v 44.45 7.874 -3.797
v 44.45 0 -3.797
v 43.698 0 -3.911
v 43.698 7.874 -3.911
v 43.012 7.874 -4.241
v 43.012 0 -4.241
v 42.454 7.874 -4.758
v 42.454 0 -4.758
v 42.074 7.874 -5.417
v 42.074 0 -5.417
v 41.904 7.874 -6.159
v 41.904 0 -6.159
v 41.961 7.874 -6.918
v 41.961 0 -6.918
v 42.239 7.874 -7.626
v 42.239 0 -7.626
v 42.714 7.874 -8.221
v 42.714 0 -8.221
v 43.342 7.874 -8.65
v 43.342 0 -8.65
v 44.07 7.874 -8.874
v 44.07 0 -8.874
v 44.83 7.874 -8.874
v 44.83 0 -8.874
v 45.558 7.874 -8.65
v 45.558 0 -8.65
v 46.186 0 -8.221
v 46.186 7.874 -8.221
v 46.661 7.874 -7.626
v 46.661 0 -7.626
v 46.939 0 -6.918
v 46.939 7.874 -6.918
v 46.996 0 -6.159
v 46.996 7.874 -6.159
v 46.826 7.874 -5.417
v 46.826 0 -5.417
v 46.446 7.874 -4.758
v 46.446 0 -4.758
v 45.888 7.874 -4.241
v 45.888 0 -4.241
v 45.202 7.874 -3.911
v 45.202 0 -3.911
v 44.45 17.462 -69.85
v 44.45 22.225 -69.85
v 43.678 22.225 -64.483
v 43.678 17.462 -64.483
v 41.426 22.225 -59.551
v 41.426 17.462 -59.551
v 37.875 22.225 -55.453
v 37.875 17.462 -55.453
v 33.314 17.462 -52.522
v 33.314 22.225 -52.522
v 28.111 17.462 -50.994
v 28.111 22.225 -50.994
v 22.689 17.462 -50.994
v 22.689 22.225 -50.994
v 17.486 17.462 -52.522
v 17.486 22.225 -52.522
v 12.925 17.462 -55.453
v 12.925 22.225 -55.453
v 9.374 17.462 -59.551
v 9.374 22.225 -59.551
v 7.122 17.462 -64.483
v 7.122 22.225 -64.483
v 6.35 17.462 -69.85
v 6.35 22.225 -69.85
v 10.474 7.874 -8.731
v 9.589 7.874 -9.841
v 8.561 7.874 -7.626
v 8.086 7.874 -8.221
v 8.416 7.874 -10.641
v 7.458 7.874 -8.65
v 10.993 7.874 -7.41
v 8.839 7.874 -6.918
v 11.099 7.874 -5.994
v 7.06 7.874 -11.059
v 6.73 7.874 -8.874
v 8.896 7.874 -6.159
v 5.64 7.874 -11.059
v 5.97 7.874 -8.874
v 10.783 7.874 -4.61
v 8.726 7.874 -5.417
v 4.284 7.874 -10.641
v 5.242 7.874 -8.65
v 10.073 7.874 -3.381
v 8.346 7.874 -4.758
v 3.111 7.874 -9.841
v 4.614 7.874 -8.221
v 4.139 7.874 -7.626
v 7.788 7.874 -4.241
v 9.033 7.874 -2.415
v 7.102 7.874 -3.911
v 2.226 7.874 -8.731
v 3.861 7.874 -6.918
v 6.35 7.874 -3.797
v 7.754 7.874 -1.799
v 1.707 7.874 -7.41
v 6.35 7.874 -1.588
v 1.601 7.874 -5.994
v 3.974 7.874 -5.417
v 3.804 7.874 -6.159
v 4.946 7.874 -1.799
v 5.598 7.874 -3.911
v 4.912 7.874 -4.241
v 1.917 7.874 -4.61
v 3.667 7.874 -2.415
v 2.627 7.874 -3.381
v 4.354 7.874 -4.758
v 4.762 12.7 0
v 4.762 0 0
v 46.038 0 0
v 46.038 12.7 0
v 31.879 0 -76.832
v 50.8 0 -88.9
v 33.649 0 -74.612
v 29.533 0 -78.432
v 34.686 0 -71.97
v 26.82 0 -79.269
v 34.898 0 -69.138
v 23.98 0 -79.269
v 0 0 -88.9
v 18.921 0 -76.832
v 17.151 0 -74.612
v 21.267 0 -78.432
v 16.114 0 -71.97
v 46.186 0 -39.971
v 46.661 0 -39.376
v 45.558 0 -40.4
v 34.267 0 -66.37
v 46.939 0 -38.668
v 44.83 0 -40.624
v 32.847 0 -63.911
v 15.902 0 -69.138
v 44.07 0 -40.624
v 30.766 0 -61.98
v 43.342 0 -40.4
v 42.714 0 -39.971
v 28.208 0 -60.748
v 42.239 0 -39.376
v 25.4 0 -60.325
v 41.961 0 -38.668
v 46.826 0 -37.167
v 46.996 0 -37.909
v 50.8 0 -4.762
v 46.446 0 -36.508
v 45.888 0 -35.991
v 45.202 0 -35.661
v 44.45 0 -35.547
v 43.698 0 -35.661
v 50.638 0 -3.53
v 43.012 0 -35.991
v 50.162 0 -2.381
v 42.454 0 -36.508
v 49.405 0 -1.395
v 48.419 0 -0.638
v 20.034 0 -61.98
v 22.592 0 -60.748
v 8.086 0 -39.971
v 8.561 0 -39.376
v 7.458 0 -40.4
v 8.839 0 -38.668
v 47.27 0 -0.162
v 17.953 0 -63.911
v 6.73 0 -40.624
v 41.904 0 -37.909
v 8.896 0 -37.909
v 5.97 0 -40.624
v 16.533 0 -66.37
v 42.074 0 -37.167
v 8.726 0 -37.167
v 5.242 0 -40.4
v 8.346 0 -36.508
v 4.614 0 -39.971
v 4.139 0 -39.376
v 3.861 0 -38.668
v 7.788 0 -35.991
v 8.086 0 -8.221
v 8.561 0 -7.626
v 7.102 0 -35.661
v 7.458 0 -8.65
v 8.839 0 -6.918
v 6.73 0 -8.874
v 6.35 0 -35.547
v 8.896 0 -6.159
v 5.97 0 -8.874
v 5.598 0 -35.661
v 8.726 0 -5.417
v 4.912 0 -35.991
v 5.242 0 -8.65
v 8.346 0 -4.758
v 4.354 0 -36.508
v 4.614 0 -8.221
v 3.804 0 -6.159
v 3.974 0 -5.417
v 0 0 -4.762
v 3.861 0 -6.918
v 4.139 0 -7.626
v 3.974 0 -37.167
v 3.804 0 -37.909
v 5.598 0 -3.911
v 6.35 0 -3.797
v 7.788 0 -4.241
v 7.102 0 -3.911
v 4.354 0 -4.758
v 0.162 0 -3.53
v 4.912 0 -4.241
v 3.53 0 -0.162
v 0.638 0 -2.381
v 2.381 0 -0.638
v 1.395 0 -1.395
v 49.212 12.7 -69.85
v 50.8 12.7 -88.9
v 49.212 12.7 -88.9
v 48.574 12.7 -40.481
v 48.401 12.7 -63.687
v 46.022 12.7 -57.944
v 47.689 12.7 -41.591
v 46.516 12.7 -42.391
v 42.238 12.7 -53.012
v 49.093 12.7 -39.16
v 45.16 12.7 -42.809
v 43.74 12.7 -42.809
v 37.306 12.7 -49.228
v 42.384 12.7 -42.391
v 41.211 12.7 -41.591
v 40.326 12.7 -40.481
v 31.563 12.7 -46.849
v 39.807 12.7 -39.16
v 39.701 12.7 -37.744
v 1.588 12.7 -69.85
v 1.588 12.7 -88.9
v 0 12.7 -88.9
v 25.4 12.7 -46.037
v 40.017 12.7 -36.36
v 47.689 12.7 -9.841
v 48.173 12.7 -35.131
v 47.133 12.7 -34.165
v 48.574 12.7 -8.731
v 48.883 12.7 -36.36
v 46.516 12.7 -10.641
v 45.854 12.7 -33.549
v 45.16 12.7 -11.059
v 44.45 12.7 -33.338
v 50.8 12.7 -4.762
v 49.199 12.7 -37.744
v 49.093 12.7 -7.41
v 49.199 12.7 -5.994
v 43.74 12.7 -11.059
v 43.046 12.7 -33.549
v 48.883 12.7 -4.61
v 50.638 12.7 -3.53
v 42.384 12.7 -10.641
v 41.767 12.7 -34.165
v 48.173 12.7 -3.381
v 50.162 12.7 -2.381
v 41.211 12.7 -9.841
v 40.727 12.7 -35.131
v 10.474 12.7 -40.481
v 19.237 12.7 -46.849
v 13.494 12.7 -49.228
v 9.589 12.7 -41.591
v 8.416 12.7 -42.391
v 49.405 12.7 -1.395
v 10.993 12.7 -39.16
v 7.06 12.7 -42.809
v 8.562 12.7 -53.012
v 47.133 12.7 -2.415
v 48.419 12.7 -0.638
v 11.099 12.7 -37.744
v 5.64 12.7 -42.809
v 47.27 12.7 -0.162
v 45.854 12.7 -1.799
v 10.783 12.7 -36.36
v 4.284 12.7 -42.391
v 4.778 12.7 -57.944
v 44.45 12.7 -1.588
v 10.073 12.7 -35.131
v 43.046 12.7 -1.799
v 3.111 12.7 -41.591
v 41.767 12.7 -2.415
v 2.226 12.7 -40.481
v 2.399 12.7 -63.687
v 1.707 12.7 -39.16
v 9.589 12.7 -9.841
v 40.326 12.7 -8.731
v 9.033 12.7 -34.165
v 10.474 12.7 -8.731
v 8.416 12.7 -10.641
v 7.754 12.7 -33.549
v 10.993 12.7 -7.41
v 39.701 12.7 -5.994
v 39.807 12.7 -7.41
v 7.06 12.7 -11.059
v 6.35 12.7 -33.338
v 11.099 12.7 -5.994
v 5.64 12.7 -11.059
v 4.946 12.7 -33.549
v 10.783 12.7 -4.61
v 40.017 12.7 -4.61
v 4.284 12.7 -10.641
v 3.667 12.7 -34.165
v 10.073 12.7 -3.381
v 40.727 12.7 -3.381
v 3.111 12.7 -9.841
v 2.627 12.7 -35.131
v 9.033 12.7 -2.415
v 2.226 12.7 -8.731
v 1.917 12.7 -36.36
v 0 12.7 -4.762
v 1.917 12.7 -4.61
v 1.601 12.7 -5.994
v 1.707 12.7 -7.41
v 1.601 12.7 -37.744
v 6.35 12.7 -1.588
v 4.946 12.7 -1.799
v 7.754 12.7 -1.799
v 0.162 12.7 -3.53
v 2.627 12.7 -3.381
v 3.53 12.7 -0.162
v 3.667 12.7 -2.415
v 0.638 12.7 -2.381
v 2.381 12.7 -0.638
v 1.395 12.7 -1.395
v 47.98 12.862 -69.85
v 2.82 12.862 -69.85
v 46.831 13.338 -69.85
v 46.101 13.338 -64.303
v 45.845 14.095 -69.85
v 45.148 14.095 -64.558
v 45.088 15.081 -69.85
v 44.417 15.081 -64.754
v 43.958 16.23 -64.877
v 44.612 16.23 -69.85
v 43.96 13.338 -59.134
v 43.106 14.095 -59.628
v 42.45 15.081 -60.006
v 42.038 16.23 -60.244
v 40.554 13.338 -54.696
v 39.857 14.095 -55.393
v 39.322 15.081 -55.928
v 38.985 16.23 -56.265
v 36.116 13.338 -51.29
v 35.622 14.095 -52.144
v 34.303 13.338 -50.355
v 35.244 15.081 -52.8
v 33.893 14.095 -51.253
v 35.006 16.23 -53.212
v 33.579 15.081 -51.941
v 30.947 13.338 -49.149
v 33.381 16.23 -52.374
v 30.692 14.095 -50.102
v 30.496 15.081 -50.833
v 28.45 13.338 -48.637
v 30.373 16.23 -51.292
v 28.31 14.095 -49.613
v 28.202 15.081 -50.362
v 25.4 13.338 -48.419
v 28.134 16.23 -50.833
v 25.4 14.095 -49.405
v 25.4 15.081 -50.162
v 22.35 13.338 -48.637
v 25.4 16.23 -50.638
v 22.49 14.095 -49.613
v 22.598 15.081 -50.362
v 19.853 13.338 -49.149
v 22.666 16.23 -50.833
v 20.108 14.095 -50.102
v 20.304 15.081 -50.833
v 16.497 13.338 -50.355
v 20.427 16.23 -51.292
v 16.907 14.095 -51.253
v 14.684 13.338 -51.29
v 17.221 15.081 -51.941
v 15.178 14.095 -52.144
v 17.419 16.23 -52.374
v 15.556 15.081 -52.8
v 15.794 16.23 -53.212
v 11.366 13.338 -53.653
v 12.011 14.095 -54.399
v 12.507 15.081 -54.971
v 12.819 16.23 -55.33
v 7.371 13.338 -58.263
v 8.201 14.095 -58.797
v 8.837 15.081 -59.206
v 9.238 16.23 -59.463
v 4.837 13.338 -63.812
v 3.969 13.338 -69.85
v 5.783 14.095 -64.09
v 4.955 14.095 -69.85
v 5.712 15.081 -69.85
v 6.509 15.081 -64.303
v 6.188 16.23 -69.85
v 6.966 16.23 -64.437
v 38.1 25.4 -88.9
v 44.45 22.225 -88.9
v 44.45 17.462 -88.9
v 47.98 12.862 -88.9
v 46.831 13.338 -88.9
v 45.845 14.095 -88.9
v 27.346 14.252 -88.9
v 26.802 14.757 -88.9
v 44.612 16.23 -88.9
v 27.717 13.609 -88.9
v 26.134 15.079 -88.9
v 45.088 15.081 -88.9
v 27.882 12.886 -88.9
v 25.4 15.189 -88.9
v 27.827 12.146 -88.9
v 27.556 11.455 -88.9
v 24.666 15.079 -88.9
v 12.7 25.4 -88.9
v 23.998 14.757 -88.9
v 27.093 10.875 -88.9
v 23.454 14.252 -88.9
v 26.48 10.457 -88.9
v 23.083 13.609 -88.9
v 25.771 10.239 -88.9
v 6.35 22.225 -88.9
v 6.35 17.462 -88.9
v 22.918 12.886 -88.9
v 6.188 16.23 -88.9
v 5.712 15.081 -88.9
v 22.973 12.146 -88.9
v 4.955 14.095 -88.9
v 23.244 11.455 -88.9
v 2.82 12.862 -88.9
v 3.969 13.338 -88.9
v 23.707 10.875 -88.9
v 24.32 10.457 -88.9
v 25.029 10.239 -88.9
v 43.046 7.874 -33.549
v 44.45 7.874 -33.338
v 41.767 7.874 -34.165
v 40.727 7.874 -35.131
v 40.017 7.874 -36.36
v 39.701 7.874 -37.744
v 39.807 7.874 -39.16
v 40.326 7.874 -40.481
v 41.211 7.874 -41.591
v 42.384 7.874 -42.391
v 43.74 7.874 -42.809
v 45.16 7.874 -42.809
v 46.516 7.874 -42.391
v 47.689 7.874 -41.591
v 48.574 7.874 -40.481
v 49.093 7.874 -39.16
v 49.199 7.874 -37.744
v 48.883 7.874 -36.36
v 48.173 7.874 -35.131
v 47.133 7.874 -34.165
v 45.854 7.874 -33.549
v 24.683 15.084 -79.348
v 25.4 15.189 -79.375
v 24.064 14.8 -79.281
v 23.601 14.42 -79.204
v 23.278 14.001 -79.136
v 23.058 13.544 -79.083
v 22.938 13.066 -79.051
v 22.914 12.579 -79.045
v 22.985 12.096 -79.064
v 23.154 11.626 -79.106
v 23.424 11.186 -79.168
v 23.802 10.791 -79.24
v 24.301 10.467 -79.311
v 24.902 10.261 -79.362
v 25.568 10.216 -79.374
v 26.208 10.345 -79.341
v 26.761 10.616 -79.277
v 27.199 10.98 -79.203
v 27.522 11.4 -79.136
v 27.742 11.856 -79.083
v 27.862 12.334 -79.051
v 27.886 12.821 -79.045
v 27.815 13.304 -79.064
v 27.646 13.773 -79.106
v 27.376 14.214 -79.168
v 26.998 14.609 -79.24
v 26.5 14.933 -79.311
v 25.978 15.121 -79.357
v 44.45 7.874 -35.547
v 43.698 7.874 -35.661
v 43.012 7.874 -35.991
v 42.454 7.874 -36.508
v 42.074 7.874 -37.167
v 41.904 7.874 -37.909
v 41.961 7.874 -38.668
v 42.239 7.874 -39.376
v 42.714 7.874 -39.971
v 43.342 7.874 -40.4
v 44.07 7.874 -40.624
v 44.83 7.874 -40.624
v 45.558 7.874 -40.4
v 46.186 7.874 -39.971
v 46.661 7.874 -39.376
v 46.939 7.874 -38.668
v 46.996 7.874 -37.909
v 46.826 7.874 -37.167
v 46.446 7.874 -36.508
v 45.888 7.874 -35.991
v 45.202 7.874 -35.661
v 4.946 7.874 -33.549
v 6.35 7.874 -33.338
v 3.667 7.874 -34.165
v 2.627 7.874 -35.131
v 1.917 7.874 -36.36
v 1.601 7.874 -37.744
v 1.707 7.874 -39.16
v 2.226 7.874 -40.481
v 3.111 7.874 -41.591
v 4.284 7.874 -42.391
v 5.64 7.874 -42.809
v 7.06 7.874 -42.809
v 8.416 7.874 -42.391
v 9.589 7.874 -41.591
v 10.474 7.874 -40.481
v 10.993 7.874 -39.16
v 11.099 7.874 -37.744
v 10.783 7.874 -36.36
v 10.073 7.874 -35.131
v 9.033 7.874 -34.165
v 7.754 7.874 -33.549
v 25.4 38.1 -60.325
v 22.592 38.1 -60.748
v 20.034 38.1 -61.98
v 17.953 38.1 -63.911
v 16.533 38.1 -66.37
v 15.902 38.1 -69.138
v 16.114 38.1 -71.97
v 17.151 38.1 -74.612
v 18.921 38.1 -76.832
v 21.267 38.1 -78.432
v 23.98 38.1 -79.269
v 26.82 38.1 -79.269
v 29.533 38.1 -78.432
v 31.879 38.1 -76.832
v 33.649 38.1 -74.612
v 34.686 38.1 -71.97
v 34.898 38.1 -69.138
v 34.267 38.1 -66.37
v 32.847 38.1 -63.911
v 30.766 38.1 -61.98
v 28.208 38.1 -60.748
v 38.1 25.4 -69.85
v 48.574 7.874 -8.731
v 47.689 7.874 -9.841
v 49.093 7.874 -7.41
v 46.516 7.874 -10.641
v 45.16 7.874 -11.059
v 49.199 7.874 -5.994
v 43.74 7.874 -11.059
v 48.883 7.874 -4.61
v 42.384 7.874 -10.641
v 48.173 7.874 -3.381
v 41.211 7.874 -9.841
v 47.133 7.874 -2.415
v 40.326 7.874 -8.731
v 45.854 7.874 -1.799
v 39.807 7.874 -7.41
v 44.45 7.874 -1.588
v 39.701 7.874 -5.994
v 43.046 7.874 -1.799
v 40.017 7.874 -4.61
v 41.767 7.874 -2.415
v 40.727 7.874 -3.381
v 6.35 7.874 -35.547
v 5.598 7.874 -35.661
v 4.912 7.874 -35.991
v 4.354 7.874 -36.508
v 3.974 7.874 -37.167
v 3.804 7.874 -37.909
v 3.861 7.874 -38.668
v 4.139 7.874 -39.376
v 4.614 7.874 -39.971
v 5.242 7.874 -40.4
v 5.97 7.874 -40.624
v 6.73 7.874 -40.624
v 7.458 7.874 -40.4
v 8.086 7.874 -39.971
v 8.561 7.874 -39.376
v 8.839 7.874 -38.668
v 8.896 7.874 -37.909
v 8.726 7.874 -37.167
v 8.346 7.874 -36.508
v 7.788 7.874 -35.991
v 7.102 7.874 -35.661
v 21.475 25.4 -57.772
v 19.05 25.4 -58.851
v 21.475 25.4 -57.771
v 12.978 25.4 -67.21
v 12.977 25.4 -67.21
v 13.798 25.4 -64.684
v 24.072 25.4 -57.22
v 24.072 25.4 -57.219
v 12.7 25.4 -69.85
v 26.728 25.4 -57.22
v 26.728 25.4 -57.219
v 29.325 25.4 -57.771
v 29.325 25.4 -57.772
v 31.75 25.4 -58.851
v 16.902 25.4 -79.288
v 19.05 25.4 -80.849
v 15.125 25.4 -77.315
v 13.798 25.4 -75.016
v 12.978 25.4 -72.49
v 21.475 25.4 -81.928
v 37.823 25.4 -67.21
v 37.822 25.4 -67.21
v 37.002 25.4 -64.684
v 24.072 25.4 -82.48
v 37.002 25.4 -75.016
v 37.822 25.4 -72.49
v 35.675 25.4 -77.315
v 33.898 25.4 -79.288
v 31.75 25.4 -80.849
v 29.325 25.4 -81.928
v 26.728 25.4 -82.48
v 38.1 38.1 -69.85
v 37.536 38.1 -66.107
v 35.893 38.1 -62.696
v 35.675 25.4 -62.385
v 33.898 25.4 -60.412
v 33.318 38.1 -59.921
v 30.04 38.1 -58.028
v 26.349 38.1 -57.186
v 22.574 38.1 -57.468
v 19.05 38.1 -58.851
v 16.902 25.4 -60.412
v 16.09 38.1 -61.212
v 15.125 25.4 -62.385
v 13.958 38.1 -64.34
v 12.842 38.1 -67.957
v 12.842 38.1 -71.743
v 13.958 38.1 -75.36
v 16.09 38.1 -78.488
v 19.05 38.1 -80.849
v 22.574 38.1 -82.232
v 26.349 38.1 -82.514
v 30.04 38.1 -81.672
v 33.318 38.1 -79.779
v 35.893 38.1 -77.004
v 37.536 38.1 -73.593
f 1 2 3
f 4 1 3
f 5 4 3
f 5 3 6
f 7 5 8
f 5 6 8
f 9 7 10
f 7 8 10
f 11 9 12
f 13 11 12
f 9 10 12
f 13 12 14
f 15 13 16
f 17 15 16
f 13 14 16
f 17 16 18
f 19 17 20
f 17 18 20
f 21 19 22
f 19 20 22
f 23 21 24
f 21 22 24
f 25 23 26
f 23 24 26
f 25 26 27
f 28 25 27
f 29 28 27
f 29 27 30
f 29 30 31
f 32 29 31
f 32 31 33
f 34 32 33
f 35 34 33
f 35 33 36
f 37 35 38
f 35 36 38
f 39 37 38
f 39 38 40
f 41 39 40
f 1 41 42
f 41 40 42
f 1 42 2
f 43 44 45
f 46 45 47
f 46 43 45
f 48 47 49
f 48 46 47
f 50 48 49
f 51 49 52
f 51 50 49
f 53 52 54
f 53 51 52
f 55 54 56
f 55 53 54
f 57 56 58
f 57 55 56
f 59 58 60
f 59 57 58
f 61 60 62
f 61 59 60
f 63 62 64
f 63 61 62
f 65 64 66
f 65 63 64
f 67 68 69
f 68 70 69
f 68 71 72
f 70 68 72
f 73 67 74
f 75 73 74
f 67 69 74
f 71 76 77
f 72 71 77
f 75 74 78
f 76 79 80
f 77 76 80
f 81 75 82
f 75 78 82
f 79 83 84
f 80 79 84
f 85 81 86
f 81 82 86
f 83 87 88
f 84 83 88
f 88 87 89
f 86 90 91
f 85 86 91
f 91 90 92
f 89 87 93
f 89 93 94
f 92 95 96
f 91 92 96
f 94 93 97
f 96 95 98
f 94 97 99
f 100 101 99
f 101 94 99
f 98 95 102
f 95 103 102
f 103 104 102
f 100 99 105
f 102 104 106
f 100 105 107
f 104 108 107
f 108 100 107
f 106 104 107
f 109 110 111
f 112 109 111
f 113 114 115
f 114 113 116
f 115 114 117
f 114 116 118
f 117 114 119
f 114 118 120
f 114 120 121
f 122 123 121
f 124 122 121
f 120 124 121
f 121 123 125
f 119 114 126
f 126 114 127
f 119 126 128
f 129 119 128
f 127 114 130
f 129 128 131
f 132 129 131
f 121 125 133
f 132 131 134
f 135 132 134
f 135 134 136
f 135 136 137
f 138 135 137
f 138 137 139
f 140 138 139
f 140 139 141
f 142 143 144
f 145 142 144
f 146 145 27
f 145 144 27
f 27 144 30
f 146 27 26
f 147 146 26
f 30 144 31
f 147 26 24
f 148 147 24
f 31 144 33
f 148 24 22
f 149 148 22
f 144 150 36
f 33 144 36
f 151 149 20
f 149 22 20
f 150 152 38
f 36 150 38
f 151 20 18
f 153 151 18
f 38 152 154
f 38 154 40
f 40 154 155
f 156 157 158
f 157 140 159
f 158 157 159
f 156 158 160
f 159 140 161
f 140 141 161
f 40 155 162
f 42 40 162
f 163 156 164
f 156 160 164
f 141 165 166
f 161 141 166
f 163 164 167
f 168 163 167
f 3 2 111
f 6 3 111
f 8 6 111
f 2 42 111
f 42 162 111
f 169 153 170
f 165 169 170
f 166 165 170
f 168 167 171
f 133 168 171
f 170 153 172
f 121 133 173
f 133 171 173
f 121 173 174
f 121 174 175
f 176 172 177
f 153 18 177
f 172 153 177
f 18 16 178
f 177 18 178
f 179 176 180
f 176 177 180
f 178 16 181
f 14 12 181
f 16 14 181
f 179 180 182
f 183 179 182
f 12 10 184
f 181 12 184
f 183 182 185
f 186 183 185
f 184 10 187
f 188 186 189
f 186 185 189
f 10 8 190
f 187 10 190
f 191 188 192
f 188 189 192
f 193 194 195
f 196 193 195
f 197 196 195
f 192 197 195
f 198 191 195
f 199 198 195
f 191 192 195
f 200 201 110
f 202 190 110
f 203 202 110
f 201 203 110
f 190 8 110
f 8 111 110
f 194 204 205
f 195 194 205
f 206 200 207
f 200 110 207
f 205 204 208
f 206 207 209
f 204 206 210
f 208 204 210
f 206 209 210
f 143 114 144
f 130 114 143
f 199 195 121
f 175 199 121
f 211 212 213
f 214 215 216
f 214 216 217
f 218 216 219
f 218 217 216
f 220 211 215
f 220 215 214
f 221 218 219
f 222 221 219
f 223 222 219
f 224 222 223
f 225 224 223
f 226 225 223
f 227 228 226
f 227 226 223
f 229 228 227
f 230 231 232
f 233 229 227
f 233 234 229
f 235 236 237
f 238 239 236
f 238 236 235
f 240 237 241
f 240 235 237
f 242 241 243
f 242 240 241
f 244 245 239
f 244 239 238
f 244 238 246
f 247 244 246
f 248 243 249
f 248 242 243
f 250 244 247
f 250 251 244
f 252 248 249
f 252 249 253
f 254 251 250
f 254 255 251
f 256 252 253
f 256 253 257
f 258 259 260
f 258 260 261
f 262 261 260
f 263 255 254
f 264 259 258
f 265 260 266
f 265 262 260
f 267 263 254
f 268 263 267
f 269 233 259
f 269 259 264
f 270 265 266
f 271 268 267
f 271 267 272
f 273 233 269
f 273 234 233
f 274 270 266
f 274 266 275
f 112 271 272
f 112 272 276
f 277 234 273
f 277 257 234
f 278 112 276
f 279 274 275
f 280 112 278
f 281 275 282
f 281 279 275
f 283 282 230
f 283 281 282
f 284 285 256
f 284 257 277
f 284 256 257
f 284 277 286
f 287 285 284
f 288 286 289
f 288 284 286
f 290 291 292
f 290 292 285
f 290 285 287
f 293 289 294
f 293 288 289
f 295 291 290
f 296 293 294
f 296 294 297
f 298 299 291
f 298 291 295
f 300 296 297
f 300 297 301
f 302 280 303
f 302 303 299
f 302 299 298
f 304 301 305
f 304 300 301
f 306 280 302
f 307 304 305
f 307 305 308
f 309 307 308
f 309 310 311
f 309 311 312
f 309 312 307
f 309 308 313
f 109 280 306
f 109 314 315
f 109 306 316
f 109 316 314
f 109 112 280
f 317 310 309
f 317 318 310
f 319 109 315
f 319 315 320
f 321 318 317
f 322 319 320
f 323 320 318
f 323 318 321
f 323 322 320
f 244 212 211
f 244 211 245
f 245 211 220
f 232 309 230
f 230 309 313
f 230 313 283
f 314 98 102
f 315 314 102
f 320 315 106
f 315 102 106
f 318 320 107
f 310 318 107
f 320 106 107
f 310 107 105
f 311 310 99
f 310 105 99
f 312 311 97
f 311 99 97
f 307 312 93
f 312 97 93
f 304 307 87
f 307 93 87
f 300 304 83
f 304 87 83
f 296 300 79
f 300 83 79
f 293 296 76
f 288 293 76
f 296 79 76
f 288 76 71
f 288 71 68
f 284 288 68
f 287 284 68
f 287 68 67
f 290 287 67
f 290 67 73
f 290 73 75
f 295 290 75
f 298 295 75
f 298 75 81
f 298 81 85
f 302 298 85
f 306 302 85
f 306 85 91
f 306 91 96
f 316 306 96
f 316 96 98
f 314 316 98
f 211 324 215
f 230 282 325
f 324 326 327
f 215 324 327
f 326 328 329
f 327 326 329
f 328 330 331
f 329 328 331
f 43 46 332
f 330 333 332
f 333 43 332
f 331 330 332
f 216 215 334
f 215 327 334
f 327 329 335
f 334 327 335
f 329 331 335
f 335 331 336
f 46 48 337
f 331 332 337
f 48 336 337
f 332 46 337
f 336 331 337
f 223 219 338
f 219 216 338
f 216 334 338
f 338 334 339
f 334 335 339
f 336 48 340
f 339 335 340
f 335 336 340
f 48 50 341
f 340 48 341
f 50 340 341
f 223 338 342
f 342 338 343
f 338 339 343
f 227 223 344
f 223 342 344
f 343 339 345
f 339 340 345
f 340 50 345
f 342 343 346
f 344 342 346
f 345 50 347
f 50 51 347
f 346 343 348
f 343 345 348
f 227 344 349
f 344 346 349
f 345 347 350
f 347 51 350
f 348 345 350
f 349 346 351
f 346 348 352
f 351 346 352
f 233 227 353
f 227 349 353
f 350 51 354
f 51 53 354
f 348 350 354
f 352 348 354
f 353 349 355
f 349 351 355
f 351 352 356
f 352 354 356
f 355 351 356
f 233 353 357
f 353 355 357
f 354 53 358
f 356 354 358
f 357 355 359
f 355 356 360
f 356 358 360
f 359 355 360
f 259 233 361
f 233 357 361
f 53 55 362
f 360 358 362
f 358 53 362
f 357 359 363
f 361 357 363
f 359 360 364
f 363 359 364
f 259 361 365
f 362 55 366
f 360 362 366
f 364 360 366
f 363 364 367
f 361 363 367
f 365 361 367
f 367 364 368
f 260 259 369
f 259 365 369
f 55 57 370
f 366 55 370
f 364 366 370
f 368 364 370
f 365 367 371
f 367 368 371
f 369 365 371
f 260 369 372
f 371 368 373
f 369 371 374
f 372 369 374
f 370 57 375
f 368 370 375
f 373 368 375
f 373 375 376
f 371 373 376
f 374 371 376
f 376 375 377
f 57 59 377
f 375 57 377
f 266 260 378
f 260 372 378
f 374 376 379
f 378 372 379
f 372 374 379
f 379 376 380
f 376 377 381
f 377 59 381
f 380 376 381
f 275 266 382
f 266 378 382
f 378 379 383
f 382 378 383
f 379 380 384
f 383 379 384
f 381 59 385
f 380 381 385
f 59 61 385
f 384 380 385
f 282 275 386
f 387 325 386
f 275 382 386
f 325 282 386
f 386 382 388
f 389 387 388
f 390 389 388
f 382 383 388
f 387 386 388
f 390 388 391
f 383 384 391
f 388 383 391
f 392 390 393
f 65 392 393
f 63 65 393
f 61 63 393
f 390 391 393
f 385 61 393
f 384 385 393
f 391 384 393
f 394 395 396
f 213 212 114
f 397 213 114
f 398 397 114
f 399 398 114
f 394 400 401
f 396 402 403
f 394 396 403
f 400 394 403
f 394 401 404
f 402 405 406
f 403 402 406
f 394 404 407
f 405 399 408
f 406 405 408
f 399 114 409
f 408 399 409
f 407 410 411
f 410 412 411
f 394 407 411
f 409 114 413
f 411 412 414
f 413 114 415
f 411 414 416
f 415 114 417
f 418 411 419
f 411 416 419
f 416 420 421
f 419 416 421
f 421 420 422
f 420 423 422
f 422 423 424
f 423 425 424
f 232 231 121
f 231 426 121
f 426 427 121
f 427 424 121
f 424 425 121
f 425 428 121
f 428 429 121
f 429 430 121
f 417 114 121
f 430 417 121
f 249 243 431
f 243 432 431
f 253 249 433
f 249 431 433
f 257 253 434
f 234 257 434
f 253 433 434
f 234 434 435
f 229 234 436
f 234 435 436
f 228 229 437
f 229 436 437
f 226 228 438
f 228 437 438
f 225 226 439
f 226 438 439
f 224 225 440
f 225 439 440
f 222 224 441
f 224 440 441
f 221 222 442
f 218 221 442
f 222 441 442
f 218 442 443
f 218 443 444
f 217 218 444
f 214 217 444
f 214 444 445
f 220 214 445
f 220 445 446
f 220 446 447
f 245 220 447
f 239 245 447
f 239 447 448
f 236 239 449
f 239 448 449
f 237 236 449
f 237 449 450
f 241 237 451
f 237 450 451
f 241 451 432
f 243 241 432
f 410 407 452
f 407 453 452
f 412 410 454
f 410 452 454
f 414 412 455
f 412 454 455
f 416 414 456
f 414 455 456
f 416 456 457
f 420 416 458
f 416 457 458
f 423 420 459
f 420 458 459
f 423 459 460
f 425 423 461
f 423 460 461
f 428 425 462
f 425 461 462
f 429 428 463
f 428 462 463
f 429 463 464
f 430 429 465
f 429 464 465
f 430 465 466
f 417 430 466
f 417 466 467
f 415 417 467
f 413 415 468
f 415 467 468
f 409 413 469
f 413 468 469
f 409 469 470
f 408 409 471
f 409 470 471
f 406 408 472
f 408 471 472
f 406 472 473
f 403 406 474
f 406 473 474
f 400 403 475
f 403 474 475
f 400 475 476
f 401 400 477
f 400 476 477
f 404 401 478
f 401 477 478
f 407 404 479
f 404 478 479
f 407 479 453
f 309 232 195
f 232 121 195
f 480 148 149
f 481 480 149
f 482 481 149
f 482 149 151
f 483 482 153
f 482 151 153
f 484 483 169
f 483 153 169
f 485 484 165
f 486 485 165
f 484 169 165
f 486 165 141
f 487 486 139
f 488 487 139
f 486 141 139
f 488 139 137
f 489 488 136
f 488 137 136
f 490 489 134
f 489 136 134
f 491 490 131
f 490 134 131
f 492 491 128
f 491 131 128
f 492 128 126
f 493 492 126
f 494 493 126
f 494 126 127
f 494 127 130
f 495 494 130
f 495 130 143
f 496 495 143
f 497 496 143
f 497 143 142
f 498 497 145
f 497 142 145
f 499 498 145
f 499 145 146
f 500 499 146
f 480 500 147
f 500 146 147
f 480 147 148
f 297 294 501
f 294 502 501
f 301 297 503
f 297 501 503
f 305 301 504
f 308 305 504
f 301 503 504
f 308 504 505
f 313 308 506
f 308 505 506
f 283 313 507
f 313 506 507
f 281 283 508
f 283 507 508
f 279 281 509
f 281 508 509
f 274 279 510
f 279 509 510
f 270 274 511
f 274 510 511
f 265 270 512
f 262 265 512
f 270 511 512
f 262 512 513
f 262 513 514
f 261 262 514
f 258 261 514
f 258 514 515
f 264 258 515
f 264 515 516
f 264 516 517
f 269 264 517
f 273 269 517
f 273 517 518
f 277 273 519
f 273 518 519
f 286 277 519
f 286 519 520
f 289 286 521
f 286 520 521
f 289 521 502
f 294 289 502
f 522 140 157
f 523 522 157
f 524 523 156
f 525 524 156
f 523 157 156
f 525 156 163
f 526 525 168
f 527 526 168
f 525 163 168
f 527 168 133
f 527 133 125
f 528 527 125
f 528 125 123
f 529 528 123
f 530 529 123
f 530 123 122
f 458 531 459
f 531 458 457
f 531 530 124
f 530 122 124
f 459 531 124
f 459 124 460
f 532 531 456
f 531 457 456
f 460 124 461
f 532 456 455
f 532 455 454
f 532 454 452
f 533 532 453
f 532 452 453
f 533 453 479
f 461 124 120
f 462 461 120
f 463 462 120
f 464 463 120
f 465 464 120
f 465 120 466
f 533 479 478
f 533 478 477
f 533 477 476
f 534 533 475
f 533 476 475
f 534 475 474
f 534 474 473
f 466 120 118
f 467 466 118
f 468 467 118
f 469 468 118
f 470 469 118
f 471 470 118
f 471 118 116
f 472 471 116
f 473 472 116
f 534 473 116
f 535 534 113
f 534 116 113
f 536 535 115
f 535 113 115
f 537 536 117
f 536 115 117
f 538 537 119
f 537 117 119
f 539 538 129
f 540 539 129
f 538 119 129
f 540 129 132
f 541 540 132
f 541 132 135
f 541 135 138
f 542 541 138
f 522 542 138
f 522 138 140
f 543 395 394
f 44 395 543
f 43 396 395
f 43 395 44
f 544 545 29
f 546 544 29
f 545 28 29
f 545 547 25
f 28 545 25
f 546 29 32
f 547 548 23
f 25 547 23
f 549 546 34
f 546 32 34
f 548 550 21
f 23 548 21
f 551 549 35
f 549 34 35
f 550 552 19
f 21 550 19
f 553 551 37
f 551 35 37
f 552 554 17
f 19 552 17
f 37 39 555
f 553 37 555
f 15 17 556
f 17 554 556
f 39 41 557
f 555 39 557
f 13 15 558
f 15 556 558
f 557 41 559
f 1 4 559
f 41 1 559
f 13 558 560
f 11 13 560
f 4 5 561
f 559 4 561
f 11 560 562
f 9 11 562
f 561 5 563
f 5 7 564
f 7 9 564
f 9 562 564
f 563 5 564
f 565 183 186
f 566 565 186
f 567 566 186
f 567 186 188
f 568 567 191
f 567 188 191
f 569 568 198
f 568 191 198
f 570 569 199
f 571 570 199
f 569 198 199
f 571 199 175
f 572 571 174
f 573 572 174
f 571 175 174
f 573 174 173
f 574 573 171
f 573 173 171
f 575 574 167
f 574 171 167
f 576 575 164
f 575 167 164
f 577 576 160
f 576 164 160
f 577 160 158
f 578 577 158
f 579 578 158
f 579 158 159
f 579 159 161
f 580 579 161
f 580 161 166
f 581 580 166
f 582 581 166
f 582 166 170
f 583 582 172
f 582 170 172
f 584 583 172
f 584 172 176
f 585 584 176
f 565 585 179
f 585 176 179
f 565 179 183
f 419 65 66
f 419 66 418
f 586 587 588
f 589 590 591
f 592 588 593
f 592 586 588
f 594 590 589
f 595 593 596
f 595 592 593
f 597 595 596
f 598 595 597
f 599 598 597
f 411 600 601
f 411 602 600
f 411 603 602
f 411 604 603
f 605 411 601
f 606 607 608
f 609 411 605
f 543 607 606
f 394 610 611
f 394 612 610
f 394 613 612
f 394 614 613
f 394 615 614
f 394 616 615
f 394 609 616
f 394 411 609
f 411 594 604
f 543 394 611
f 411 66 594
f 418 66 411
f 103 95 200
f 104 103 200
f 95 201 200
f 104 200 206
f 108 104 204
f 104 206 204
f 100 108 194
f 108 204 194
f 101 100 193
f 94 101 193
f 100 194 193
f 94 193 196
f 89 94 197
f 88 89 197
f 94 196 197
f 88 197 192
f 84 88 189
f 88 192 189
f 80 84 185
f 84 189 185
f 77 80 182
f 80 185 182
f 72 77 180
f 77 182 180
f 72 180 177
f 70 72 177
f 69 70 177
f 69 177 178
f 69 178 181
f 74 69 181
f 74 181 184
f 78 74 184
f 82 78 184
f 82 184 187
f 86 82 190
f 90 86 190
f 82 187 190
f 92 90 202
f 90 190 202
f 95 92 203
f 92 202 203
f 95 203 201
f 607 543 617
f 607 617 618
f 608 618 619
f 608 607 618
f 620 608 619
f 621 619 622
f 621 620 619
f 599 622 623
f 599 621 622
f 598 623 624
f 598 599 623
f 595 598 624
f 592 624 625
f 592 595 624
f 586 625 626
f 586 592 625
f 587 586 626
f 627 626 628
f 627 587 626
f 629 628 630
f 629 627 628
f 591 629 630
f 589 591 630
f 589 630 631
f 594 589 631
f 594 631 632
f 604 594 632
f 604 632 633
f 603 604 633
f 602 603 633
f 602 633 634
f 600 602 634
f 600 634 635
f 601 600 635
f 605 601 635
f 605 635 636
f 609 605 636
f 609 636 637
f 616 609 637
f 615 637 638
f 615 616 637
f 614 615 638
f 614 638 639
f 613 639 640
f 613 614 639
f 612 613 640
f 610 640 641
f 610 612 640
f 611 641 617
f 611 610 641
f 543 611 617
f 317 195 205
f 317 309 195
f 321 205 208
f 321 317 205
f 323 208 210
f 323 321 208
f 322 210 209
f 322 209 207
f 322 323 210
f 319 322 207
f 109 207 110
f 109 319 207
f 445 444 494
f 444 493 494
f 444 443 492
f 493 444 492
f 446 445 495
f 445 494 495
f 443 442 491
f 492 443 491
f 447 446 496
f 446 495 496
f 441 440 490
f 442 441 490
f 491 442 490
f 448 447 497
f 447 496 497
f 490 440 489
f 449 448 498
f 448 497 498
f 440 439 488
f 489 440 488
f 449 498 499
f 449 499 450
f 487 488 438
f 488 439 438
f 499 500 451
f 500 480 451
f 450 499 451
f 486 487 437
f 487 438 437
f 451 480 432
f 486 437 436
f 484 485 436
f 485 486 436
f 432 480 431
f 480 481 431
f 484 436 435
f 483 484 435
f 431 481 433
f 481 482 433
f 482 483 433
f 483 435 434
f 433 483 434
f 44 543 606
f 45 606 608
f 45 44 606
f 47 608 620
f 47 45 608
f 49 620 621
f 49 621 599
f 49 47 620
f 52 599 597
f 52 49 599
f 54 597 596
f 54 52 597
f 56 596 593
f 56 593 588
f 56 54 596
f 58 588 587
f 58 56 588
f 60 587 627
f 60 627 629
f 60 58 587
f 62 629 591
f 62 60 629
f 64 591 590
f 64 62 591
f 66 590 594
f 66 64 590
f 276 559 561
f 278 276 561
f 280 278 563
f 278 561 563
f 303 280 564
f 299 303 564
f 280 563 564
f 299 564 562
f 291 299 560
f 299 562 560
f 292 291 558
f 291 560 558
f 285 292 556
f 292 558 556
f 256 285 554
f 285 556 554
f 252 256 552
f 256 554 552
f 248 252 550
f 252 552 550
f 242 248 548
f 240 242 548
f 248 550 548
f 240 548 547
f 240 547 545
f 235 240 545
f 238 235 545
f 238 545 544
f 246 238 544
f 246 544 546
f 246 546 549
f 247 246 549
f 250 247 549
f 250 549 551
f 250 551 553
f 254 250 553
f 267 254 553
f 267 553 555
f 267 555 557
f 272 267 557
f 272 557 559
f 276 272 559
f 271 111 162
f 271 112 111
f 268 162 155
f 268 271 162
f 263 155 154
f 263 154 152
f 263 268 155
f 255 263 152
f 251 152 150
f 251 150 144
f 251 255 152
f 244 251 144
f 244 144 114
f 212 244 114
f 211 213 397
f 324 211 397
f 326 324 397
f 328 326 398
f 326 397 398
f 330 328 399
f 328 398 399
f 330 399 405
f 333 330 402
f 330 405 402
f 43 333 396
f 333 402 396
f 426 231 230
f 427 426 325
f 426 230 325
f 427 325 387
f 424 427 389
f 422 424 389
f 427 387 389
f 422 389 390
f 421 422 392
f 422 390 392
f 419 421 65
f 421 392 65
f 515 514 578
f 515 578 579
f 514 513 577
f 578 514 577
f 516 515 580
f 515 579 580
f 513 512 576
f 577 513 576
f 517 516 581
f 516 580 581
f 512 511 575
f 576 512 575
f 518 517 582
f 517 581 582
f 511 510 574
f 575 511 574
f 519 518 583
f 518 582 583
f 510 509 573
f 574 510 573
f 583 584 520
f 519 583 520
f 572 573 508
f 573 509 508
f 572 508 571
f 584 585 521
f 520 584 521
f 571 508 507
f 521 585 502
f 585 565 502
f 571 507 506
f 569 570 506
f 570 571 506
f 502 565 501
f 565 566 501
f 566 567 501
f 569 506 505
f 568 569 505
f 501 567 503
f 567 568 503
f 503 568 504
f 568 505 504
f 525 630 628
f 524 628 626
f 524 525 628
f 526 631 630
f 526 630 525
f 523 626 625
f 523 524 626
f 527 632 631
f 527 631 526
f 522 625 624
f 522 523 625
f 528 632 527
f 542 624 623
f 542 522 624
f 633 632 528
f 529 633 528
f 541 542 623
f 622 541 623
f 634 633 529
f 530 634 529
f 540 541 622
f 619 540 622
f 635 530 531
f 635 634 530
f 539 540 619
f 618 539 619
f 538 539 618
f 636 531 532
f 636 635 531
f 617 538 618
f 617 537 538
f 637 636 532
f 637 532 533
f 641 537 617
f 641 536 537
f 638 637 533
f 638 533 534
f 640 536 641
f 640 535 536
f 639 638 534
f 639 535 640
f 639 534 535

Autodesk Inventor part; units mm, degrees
ref_plane "YZ Plane" through (0, 0, 0) normal (1, 0, 0) x (0, 1, 0)
ref_plane "XZ Plane" through (0, 0, 0) normal (0, 1, 0) x (-1, 0, 0)
ref_plane "XY Plane" through (0, 0, 0) normal (0, 0, 1) x (1, 0, 0)
sketch "Sketch1" plane through (0, 0, 0) normal (0, 1, 0) x (-1, 0, 0)
  line L0 (0, 0) -> (-50.8, 0)
  line L1 (-50.8, 0) -> (-50.8, -88.9)
  line L2 (-50.8, -88.9) -> (0, -88.9)
  line L3 (0, -88.9) -> (0, 0)
  dimension "d0" = 50.8
  dimension "d1" = 88.9
extrude "Extrusion1" add sketch "Sketch1" along normal blind 12.7
sketch "Sketch2" plane through (0, 12.7, 0) normal (0, 1, 0) x (1, 0, 0)
  line L0 (50.8, 0) -> (50.8, 88.9) projected
  line L1 (50.8, 88.9) -> (0, 88.9) projected
  line L2 (0, 88.9) -> (0, 0) projected
  line L3 (6.35, 88.9) -> (44.45, 88.9)
  line L4 (44.45, 88.9) -> (44.45, 69.85)
  line L5 (44.45, 69.85) -> (6.35, 69.85)
  line L6 (6.35, 69.85) -> (6.35, 88.9)
  line L7 (6.35, 79.375) -> (0, 79.375) construction
  line L8 (44.45, 79.375) -> (50.8, 79.375) construction
  circle A0 centre (25.4, 69.85) radius 19.05
  dimension "d4" = 19.05
  dimension "d5" = 6.35
extrude "Extrusion2" add sketch "Sketch2" along normal blind 12.7
sketch "Sketch3" plane through (0, 25.4, 0) normal (0, 1, 0) x (1, 0, 0)
  arc A0 (6.35, 69.85) -> (44.45, 69.85) centre (25.4, 69.85) ccw projected
  circle A1 centre (25.4, 69.85) radius 12.7
  point P0 (0, 0)
  dimension "d8" = 25.4
extrude "Extrusion3" add sketch "Sketch3" along normal blind 12.7
sketch "Sketch6" plane through (0, 12.7, 0) normal (0, 1, 0) x (1, 0, 0)
  line L0 (0, 88.9) -> (0, 0) projected
  line L1 (0, 0) -> (50.8, 0) projected
  line L2 (50.8, 0) -> (50.8, 88.9) projected
  line L3 (44.45, 88.9) -> (44.45, 6.35) construction
  line L4 (44.45, 6.35) -> (6.35, 6.35) construction
  line L5 (6.35, 6.35) -> (6.35, 88.9) construction
  line L6 (6.35, 38.1) -> (44.45, 38.1) construction
  dimension "d35" = 6.35
  dimension "d36" = 31.75
hole "Hole3" at (25.4, 38.1, -69.85) direction (0, -1, 0) diameter 19.05 end through all
sketch "Sketch7" plane through (50.8, 0, -88.9) normal (0, 0, -1) x (-1, 0, 0)
  line L0 (0, 0) -> (0, 12.7) projected
  line L1 (44.45, 12.7) -> (6.35, 12.7) construction
  point P0 (25.4, 12.7)
hole "Hole4" at (25.4, 12.7, -88.9) direction (0, 0, 1) diameter 4.9784 end up to surface thread size "1/4-20 UNC" class "2B" standard "ANSI Unified Screw Threads"
hole "Hole5" at (6.35, 12.7, -6.35) at (6.35, 12.7, -38.1) at (44.45, 12.7, -6.35) at (44.45, 12.7, -38.1) direction (0, -1, 0) diameter 5.1054 end through all counterbore diameter 9.525 counterbore depth 4.826 clearance for "Socket Head Cap Screw" size "#10" standard "Ansi Unified Screw Threads"
fillet "Fillet1" radius 4.7625 5 edges at (25.4, 12.7, -50.8) (6.35, 12.7, -79.375) (44.45, 12.7, -79.375) (0, 6.35, 0) (50.8, 6.35, 0)
chamfer "Chamfer1" distance 6.35 distance2 3.175 3 edges at (44.45, 25.4, -79.375) (25.4, 25.4, -50.8) (6.35, 25.4, -79.375) measured on face at (24.8897, 25.4, -86.7525)
properties part number "Fillet Chamfer Complete"
